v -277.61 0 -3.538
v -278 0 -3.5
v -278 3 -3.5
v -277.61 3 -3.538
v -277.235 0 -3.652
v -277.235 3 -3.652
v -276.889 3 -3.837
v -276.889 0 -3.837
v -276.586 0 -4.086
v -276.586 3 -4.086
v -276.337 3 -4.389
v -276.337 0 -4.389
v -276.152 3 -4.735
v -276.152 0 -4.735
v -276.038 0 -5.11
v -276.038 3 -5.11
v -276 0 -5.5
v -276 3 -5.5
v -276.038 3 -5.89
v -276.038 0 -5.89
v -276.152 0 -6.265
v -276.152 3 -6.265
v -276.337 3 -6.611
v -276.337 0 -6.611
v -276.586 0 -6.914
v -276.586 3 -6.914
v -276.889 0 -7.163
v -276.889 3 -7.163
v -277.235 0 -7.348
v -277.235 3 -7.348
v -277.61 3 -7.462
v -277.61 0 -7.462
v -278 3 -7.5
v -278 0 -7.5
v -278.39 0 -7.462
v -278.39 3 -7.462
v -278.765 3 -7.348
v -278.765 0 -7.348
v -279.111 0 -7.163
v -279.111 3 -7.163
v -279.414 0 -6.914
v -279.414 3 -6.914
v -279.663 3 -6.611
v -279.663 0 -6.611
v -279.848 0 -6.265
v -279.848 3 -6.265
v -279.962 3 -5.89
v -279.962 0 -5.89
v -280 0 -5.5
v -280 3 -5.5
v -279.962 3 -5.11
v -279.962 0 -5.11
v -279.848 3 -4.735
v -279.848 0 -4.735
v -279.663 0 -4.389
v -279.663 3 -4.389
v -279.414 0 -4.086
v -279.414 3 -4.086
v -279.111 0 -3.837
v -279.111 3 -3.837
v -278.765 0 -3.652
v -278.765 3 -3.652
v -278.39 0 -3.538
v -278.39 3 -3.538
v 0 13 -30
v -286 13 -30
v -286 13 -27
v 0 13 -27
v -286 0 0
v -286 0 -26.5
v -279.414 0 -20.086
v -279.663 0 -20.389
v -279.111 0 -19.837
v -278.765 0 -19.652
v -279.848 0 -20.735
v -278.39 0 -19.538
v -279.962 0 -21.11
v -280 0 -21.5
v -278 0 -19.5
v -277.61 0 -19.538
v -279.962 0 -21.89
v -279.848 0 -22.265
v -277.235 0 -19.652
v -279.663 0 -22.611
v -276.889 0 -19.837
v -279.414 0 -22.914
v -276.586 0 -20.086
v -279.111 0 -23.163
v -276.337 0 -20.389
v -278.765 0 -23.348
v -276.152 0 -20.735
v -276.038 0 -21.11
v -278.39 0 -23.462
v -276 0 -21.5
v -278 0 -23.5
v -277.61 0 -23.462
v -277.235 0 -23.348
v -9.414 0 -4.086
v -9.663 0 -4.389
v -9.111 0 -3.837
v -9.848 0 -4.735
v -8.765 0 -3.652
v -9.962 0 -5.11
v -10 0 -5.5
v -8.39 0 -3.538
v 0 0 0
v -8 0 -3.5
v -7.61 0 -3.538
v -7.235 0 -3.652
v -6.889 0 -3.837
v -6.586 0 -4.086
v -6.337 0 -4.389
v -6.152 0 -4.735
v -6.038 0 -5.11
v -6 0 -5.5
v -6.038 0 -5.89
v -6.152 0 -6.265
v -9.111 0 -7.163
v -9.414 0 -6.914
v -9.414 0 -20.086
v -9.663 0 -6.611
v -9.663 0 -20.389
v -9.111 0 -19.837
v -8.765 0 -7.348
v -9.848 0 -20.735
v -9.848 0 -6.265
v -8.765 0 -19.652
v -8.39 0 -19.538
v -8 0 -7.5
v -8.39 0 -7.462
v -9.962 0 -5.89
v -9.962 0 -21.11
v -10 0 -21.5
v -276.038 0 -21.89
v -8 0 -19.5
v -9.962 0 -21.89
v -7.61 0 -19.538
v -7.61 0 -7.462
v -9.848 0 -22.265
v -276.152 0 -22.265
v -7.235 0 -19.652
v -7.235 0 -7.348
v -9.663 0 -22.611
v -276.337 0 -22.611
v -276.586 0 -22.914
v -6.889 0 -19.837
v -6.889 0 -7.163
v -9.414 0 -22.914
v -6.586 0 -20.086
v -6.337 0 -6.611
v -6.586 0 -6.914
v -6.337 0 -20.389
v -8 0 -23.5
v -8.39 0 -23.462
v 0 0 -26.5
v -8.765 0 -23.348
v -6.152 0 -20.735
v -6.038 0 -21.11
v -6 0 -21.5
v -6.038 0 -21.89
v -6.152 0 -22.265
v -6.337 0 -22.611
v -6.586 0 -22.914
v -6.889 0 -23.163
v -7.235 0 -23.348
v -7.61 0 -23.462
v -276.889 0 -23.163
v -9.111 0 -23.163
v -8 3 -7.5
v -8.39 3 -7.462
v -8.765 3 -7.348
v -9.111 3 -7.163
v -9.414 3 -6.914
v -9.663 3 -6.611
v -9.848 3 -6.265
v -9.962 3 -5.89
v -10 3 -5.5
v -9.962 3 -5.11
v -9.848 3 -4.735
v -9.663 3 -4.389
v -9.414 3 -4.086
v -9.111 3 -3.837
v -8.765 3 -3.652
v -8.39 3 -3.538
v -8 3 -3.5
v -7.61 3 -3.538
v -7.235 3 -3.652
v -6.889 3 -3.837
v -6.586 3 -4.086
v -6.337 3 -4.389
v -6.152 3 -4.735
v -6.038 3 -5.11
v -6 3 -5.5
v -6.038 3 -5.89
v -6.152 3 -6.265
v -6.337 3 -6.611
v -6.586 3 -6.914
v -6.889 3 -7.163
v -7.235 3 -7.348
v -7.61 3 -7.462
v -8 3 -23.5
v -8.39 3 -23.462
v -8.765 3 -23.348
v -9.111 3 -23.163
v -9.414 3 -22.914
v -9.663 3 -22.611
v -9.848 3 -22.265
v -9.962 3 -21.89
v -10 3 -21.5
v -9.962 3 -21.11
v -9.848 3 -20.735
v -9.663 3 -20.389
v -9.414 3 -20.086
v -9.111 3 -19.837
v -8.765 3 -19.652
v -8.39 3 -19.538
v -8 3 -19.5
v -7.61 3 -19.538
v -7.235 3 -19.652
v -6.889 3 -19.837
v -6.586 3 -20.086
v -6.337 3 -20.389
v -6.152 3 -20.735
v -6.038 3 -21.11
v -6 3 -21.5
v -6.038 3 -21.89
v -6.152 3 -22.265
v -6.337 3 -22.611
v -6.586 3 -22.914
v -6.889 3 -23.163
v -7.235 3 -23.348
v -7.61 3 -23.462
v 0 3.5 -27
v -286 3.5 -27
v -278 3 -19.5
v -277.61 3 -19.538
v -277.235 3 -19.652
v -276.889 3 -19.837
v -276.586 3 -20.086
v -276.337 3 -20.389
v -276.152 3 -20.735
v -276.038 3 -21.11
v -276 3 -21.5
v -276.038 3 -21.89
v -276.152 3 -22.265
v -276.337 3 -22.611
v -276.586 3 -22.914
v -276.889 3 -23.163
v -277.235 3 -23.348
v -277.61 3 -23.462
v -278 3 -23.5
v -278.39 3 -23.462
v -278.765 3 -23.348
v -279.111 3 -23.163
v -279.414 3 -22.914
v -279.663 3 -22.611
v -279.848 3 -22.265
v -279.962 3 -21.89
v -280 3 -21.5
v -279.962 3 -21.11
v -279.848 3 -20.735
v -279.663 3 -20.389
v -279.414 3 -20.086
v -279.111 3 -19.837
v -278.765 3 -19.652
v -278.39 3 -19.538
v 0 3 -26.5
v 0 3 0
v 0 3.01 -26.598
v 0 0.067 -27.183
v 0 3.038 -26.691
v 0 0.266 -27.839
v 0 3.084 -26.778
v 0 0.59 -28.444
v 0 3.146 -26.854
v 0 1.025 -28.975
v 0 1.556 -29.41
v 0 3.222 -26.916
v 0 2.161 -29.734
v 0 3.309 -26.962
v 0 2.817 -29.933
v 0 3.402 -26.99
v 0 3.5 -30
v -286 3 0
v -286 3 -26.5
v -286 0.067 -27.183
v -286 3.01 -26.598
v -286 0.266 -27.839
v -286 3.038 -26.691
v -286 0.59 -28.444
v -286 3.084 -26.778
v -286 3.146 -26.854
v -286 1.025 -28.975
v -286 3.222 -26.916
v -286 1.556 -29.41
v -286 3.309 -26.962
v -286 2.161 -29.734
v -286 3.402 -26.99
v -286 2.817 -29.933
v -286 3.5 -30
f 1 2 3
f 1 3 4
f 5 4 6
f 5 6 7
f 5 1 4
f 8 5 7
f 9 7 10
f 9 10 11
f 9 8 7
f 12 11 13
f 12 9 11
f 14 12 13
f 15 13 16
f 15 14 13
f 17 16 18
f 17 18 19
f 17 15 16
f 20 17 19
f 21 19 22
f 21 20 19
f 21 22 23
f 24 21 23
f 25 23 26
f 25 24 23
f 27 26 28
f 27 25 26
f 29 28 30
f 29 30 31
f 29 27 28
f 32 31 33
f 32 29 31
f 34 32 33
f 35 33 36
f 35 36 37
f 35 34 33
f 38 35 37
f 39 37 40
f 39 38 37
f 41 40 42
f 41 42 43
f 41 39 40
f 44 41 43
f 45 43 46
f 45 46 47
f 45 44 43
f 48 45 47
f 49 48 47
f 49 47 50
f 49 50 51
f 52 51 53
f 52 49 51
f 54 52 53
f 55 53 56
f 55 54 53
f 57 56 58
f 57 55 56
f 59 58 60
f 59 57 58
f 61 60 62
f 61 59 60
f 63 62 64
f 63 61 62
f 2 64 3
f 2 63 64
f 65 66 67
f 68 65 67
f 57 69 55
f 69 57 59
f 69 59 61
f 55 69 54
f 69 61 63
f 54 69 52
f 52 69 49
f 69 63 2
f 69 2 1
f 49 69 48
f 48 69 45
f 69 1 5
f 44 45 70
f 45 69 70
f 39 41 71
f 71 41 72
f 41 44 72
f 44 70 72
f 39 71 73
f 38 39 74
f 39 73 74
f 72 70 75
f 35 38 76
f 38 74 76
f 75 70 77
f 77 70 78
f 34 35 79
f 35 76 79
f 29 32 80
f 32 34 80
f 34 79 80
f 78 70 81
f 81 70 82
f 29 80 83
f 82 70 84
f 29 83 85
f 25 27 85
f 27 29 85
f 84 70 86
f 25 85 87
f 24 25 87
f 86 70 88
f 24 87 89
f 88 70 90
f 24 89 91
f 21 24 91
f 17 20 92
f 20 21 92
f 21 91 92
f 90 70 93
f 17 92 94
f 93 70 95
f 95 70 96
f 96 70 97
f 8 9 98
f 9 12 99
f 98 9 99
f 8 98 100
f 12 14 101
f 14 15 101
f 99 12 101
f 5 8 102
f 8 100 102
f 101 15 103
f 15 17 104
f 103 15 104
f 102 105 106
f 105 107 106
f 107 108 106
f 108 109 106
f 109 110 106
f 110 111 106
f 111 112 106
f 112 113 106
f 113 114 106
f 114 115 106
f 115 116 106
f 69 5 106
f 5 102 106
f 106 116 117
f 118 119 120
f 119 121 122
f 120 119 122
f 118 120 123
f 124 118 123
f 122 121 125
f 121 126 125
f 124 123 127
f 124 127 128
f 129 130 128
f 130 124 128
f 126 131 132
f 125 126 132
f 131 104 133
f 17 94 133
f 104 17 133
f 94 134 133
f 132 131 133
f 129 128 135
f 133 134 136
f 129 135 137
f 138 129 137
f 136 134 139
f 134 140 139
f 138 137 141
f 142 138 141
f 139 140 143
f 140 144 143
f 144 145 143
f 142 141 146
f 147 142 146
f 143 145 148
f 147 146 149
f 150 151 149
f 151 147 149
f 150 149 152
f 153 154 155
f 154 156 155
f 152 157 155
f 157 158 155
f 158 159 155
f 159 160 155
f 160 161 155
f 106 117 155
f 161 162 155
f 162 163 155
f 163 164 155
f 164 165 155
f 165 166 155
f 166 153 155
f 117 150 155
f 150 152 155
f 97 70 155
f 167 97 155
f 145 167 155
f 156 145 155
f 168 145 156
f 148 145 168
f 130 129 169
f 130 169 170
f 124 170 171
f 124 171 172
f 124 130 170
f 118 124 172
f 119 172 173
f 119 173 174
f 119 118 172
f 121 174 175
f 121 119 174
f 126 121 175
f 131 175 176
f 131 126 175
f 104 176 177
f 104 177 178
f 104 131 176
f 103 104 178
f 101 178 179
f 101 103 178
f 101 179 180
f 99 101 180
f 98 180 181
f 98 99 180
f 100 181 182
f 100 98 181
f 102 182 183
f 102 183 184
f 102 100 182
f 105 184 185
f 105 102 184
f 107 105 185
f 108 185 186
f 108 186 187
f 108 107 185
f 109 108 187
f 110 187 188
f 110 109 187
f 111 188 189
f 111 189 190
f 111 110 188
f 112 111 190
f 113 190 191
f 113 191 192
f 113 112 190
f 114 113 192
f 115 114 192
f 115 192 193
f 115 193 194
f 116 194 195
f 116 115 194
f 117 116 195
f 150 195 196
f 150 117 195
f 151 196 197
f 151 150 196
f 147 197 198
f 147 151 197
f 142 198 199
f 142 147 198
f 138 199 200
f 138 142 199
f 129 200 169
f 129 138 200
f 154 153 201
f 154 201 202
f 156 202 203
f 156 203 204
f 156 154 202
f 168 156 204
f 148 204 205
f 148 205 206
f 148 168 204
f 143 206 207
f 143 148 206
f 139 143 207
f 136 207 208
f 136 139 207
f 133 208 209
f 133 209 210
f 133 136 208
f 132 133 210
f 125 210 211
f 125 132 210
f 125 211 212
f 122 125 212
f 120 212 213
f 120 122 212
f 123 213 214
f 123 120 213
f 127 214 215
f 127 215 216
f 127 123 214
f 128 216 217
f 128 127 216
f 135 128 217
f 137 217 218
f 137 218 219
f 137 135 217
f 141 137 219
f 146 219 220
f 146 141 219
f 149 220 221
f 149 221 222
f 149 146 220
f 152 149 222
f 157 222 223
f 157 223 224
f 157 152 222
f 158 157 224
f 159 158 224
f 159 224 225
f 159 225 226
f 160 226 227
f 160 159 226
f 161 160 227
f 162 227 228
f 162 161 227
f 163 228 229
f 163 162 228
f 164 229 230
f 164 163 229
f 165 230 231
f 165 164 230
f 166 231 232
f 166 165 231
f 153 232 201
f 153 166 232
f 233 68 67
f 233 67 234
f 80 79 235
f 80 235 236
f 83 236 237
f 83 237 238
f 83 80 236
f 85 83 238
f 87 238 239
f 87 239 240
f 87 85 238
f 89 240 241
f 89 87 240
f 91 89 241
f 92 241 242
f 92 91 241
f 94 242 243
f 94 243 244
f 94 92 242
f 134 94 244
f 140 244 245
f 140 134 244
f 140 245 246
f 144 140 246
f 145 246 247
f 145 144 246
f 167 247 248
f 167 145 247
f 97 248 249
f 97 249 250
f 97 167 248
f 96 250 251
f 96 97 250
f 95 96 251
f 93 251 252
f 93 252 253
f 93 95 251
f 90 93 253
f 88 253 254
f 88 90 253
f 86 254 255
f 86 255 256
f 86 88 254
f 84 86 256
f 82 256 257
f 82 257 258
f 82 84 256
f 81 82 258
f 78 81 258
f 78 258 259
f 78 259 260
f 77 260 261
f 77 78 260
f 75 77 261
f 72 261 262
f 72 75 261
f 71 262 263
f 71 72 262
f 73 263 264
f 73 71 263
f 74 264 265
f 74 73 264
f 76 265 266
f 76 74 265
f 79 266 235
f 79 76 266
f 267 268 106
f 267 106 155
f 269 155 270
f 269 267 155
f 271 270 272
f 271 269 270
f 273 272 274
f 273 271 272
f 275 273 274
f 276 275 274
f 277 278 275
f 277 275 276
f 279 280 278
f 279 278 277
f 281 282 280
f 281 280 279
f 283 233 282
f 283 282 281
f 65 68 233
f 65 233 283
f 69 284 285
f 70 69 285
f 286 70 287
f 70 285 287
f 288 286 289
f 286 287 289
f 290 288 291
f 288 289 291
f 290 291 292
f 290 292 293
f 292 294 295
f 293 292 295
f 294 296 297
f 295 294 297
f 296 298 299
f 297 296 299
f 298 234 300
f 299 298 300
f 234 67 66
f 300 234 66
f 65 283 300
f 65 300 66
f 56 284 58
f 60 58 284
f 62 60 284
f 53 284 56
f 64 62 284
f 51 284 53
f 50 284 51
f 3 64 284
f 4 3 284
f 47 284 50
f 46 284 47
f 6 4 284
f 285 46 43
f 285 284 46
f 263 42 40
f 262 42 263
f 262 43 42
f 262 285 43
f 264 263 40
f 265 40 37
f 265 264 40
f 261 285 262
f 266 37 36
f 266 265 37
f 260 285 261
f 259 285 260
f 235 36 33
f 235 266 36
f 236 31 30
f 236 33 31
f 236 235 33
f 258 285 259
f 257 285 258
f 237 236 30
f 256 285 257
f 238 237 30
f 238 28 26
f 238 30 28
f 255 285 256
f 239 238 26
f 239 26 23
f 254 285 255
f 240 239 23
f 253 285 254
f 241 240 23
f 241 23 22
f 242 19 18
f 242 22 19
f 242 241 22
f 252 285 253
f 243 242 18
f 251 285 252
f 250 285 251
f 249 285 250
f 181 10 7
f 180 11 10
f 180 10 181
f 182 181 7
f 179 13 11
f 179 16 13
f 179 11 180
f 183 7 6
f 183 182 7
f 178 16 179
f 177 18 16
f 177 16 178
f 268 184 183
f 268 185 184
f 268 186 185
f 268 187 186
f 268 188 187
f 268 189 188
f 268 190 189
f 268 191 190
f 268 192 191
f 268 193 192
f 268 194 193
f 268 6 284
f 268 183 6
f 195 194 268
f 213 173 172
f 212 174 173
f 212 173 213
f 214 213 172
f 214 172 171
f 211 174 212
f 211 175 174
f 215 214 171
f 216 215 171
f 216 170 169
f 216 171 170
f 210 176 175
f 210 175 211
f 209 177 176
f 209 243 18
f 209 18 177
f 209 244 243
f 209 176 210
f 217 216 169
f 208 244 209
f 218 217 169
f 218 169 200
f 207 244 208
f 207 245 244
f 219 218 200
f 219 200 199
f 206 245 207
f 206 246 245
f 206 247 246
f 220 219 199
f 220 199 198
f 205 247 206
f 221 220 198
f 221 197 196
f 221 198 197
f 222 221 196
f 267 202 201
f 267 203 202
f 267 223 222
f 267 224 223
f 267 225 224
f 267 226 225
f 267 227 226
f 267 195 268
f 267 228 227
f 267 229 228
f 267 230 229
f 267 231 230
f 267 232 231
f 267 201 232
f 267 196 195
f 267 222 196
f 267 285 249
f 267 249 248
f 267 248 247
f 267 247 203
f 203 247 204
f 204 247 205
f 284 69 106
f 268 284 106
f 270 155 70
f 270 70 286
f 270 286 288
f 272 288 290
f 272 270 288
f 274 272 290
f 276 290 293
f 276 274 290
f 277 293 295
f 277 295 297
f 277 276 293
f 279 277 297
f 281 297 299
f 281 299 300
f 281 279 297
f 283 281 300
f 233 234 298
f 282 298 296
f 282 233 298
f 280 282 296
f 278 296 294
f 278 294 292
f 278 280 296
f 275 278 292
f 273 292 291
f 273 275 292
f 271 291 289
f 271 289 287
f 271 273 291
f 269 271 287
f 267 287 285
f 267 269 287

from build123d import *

# Parameters (mm, degrees)
SKETCH1_W                    = 286
SKETCH1_H                    = 27
SKETCH1_R                    = 2
BOSS_EXTRUDE1_DEPTH          = 3
EDGE_FLANGE3_STRIP_W         = 13
EDGE_FLANGE3_STRIP_H         = 3
EDGE_FLANGE3_STRIP_CUT_DEPTH = 286
EDGE_FLANGE3_DEPTH           = 286


# Sheet-metal steps are written as plain solids
with BuildPart() as part:
    # Sketch1 → Boss-Extrude1 (new body)
    with BuildSketch(Plane(origin=(0, 0, 0), x_dir=(1, 0, 0), z_dir=(0, 1, 0))):
        with Locations((-143, 13.5)):
            Rectangle(SKETCH1_W, SKETCH1_H)
        with Locations(Location((-278, 21.5, 0), (0, 0, 270))):
            Circle(SKETCH1_R, mode=Mode.SUBTRACT)
        with Locations(Location((-278, 5.5, 0), (0, 0, 270))):
            Circle(SKETCH1_R, mode=Mode.SUBTRACT)
        with Locations(Location((-8, 21.5, 0), (0, 0, 90))):
            Circle(SKETCH1_R, mode=Mode.SUBTRACT)
        with Locations(Location((-8, 5.5, 0), (0, 0, 90))):
            Circle(SKETCH1_R, mode=Mode.SUBTRACT)
    extrude(amount=BOSS_EXTRUDE1_DEPTH)

    # Edge-Flange3 strip (across the edge) → Edge-Flange3 strip cut (cut)
    with BuildSketch(Plane(origin=(0, 3, -27), x_dir=(0, 0, 1), z_dir=(-1, 0, 0))):
        with Locations((-6, -1.5)):
            Rectangle(EDGE_FLANGE3_STRIP_W, EDGE_FLANGE3_STRIP_H)
    extrude(amount=EDGE_FLANGE3_STRIP_CUT_DEPTH, mode=Mode.SUBTRACT)

    # Edge-Flange3 section (across the edge) → Edge-Flange3 (add)
    with BuildSketch(Plane(origin=(0, 3, -27), x_dir=(0, 0, 1), z_dir=(-1, 0, 0))):
        with BuildLine():
            Line((-3, 0.5), (-3, 10))
            Line((-3, 10), (0, 10))
            Line((0, 10), (0, 0.5))
            ThreePointArc((0, 0.5), (0.146446609, 0.146446609), (0.5, 0))
            Line((0.5, 0), (0.5, -3))
            ThreePointArc((0.5, -3), (-1.974873734, -1.974873734), (-3, 0.5))
        make_face()
    extrude(amount=EDGE_FLANGE3_DEPTH)


solid = part.part
